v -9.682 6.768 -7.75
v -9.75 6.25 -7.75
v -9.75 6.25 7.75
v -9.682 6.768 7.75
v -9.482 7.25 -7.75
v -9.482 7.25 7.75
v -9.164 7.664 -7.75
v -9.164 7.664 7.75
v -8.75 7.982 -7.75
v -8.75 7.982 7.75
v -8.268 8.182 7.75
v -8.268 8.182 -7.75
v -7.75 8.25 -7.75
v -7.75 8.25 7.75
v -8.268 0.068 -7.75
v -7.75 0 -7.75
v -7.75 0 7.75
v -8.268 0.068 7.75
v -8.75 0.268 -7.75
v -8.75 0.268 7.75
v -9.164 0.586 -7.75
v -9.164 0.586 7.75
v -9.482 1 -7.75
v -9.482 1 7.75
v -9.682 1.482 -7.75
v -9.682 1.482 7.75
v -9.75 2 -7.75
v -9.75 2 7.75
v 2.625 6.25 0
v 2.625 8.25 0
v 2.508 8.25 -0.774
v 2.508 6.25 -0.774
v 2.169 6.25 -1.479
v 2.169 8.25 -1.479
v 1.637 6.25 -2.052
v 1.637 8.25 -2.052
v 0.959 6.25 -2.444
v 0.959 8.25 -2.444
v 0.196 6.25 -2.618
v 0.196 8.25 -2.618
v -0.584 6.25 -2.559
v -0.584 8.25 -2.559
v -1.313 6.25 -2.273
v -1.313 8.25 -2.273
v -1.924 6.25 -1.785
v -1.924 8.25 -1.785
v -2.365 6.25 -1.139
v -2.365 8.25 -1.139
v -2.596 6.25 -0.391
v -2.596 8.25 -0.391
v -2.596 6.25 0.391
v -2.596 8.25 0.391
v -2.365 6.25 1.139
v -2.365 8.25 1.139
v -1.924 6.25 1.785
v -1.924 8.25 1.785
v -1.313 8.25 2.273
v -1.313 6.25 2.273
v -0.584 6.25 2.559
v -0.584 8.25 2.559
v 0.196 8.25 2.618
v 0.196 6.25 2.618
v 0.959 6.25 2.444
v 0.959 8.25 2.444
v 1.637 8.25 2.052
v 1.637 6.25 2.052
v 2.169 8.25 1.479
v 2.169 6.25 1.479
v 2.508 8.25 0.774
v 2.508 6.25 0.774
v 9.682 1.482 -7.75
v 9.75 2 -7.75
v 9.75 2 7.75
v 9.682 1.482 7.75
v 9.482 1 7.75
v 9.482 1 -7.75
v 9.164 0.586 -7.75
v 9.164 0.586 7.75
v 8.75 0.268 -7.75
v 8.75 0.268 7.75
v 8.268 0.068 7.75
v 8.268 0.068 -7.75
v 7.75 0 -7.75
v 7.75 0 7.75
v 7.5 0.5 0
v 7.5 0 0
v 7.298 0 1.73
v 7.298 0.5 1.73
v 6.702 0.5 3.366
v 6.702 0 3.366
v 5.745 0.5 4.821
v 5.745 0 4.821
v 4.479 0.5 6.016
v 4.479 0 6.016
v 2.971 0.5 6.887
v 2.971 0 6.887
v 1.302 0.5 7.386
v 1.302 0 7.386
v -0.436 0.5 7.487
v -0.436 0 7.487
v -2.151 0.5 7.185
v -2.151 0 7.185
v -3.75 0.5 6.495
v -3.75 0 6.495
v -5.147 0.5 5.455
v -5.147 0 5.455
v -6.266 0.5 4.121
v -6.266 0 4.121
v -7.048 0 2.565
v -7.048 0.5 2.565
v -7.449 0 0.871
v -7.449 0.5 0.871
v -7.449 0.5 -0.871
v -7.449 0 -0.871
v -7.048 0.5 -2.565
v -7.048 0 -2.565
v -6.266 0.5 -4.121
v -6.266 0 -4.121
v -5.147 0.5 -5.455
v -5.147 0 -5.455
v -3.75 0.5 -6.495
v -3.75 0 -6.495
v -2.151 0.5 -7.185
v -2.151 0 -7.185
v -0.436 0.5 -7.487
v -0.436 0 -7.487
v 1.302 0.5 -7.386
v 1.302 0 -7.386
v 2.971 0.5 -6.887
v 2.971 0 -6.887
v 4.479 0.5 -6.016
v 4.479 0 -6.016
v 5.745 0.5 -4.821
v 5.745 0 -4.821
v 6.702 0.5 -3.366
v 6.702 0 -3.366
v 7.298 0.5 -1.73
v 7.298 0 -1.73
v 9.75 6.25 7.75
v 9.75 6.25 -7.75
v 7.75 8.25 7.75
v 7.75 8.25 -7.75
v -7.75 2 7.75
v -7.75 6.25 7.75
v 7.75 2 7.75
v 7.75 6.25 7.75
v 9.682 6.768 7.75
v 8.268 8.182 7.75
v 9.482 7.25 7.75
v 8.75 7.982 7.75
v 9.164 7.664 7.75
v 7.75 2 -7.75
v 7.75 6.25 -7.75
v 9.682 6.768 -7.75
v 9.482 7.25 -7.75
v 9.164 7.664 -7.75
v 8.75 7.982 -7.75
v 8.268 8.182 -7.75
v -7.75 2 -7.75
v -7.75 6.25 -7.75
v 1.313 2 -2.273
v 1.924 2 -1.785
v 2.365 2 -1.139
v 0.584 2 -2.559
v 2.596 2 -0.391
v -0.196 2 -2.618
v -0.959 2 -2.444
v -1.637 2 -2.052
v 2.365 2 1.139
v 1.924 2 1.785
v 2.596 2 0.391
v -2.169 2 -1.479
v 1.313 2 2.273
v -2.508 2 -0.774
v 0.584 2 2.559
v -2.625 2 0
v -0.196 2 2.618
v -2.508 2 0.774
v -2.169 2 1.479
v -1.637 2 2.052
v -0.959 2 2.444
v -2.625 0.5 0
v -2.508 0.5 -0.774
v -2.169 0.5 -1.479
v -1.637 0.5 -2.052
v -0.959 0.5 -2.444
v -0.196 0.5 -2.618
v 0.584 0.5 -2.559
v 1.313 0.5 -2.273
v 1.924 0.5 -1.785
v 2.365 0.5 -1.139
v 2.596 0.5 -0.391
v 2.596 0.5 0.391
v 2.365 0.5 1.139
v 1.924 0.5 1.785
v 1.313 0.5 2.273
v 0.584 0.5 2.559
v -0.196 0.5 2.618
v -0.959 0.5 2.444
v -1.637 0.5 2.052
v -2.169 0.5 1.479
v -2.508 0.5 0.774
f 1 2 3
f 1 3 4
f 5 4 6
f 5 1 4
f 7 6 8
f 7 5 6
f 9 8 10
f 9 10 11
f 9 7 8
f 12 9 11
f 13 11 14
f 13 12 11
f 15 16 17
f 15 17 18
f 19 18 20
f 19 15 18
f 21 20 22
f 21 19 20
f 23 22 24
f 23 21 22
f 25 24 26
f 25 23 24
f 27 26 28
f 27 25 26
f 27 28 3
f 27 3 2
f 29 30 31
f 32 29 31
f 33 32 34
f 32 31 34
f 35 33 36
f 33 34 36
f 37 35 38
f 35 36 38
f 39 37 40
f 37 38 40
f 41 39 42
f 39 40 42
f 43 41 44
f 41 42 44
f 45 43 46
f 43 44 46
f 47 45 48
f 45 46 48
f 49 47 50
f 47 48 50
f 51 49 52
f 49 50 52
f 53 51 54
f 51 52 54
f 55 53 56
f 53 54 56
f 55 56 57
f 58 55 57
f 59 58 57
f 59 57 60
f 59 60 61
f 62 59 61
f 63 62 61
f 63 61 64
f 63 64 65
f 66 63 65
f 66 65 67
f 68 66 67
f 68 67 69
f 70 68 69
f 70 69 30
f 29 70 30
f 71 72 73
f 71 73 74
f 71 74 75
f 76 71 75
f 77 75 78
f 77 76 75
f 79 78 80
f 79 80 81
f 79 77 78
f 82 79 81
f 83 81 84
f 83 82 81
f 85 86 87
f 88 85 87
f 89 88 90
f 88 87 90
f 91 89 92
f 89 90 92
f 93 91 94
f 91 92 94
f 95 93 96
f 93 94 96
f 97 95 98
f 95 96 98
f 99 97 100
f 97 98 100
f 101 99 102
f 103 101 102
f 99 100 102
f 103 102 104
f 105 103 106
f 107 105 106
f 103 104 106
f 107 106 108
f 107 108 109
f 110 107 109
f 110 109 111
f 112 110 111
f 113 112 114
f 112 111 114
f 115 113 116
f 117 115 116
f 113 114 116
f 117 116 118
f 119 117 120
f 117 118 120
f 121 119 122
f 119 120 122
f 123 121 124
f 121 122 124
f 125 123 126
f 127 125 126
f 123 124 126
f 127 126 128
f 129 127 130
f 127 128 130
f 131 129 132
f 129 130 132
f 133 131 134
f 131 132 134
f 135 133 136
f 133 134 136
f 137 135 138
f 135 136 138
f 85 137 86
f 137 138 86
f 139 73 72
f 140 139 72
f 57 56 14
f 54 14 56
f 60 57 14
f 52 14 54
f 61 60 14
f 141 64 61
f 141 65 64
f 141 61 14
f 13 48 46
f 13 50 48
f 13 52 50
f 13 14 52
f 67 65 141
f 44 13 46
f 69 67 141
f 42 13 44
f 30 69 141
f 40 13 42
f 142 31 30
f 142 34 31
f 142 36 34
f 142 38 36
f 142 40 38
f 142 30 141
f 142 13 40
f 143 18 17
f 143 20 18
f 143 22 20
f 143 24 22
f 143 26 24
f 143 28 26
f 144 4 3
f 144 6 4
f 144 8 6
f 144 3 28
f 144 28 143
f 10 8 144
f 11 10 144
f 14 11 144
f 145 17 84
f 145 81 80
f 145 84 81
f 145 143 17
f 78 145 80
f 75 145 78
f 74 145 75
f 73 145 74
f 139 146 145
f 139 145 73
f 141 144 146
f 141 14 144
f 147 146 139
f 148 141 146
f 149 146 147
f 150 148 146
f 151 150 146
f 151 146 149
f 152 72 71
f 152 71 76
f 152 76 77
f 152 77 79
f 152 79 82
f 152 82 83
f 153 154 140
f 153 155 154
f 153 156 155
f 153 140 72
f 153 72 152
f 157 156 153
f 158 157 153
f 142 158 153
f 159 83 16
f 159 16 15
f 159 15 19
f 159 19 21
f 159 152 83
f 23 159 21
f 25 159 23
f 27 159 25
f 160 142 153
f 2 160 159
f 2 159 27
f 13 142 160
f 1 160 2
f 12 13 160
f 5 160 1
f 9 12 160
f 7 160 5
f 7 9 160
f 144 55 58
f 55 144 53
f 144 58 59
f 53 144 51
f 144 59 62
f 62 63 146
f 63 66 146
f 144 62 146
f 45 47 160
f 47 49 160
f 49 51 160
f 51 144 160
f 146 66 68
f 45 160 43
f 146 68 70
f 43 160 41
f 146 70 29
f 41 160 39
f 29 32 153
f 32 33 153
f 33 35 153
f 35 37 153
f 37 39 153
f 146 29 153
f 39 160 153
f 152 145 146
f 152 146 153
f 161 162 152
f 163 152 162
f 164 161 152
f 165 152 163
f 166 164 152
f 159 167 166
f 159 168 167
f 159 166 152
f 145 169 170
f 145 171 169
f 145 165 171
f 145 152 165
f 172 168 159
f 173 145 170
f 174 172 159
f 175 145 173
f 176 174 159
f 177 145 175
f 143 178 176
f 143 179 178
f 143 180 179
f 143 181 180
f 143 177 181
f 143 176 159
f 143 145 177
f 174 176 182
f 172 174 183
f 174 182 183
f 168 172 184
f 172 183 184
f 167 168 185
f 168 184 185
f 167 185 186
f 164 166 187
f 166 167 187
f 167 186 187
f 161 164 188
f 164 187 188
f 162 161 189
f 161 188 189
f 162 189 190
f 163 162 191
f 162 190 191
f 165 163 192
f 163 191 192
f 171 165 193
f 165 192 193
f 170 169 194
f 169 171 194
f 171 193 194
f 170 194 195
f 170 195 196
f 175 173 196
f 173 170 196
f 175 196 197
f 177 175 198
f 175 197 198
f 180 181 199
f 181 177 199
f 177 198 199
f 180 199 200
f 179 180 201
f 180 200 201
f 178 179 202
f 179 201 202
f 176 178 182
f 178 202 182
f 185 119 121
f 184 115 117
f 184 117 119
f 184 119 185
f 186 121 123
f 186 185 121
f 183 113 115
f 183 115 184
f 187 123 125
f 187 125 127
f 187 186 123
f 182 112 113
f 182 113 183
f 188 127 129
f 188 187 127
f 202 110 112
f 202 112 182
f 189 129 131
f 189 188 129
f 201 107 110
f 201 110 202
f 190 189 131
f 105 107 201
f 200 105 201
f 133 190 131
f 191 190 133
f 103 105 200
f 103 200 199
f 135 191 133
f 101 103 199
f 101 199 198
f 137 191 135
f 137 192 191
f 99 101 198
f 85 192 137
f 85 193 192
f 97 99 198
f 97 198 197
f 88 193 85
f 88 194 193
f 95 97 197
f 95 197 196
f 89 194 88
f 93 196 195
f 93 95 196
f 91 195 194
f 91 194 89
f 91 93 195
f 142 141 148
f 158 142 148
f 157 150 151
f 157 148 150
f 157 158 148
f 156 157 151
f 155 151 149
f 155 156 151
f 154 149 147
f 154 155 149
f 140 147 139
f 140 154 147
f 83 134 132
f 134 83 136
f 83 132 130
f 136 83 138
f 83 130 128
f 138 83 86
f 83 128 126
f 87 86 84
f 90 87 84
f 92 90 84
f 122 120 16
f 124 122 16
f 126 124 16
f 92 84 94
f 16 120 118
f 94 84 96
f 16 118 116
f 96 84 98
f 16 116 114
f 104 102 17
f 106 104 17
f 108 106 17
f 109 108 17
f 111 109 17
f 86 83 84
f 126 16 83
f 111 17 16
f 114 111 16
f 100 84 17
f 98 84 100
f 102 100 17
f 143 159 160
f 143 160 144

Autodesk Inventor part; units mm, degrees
ref_plane "YZ Plane" through (0, 0, 0) normal (1, 0, 0) x (0, 1, 0)
ref_plane "XZ Plane" through (0, 0, 0) normal (0, 1, 0) x (-1, 0, 0)
sketch "Sketch1" plane through (0, 0, 0) normal (0, 1, 0) x (-1, 0, 0)
  line L0 (-7.75, -7.75) -> (7.75, -7.75)
  line L1 (7.75, -7.75) -> (7.75, 7.75)
  line L2 (7.75, 7.75) -> (-7.75, 7.75)
  line L3 (-7.75, 7.75) -> (-7.75, -7.75)
  line L4 (-7.75, -7.75) -> (7.75, 7.75) construction
  line L5 (7.75, -7.75) -> (-7.75, 7.75) construction
  line L6 (7.75, 7.75) -> (9.75, 7.75)
  line L7 (9.75, 7.75) -> (9.75, -7.75)
  line L8 (9.75, -7.75) -> (7.75, -7.75)
  line L9 (7.75, -7.75) -> (7.75, 7.75)
  line L10 (-7.75, 7.75) -> (-9.75, 7.75)
  line L11 (-9.75, 7.75) -> (-9.75, -7.75)
  line L12 (-9.75, -7.75) -> (-7.75, -7.75)
  line L13 (-7.75, -7.75) -> (-7.75, 7.75)
  circle A0 centre (0, 0) radius 2.625
  dimension "d0" = 15.5
  dimension "d1" = 15.5
  dimension "d2" = 2
  dimension "d3" = 2
  dimension "d4" = 5.25
extrude "Extrusion1" add sketch "Sketch1" along normal blind 2 contours L3 L2 L1 L0
extrude "Extrusion2" add sketch "Sketch1" along normal blind 8.25 contours L12 L11 L10 L3 | L1 L6 L7 L8
ref_plane "Work Plane1" through (-9.75, 8.25, 7.75) normal (0, 1, 0) x (1, 0, 0)
sketch "Sketch2" plane through (-9.75, 8.25, 7.75) normal (0, 1, 0) x (1, 0, 0)
  line L0 (0, 0) -> (2, 0) projected
  line L1 (19.5, 15.5) -> (17.5, 15.5) projected
  line L2 (0, 0) -> (19.5, 0)
  line L3 (19.5, 0) -> (19.5, 15.5)
  line L4 (19.5, 15.5) -> (0, 15.5)
  line L5 (0, 15.5) -> (0, 0)
  circle A0 centre (9.75, 7.75) radius 2.625
  line L6 (17.5, 15.5) -> (2, 15.5) projected
  line L7 (0, 0) -> (2, 0)
  line L8 (2, 0) -> (2, 15.5)
  line L9 (2, 15.5) -> (0, 15.5)
  line L10 (0, 15.5) -> (0, 0)
  line L11 (17.5, 0) -> (17.5, 15.5) projected
  line L12 (19.5, 15.5) -> (17.5, 15.5)
  line L13 (17.5, 15.5) -> (17.5, 0)
  line L14 (17.5, 0) -> (19.5, 0)
  line L15 (19.5, 0) -> (19.5, 15.5)
  dimension "d9" = 5.25
extrude "Extrusion3" add sketch "Sketch2" against normal blind 2 contours L8 L4 L11 L2
sketch "Sketch3" plane through (0, 0, 0) normal (0, -1, 0) x (1, 0, 0)
  circle A0 centre (0, 0) radius 7.5
  dimension "d13" = 15
extrude "Extrusion4" cut sketch "Sketch3" against normal blind 0.5
fillet "Fillet2" radius 2 4 edges at (9.75, 8.25, 0) (-9.75, 8.25, 0) (9.75, 0, 0) (-9.75, 0, 0)
